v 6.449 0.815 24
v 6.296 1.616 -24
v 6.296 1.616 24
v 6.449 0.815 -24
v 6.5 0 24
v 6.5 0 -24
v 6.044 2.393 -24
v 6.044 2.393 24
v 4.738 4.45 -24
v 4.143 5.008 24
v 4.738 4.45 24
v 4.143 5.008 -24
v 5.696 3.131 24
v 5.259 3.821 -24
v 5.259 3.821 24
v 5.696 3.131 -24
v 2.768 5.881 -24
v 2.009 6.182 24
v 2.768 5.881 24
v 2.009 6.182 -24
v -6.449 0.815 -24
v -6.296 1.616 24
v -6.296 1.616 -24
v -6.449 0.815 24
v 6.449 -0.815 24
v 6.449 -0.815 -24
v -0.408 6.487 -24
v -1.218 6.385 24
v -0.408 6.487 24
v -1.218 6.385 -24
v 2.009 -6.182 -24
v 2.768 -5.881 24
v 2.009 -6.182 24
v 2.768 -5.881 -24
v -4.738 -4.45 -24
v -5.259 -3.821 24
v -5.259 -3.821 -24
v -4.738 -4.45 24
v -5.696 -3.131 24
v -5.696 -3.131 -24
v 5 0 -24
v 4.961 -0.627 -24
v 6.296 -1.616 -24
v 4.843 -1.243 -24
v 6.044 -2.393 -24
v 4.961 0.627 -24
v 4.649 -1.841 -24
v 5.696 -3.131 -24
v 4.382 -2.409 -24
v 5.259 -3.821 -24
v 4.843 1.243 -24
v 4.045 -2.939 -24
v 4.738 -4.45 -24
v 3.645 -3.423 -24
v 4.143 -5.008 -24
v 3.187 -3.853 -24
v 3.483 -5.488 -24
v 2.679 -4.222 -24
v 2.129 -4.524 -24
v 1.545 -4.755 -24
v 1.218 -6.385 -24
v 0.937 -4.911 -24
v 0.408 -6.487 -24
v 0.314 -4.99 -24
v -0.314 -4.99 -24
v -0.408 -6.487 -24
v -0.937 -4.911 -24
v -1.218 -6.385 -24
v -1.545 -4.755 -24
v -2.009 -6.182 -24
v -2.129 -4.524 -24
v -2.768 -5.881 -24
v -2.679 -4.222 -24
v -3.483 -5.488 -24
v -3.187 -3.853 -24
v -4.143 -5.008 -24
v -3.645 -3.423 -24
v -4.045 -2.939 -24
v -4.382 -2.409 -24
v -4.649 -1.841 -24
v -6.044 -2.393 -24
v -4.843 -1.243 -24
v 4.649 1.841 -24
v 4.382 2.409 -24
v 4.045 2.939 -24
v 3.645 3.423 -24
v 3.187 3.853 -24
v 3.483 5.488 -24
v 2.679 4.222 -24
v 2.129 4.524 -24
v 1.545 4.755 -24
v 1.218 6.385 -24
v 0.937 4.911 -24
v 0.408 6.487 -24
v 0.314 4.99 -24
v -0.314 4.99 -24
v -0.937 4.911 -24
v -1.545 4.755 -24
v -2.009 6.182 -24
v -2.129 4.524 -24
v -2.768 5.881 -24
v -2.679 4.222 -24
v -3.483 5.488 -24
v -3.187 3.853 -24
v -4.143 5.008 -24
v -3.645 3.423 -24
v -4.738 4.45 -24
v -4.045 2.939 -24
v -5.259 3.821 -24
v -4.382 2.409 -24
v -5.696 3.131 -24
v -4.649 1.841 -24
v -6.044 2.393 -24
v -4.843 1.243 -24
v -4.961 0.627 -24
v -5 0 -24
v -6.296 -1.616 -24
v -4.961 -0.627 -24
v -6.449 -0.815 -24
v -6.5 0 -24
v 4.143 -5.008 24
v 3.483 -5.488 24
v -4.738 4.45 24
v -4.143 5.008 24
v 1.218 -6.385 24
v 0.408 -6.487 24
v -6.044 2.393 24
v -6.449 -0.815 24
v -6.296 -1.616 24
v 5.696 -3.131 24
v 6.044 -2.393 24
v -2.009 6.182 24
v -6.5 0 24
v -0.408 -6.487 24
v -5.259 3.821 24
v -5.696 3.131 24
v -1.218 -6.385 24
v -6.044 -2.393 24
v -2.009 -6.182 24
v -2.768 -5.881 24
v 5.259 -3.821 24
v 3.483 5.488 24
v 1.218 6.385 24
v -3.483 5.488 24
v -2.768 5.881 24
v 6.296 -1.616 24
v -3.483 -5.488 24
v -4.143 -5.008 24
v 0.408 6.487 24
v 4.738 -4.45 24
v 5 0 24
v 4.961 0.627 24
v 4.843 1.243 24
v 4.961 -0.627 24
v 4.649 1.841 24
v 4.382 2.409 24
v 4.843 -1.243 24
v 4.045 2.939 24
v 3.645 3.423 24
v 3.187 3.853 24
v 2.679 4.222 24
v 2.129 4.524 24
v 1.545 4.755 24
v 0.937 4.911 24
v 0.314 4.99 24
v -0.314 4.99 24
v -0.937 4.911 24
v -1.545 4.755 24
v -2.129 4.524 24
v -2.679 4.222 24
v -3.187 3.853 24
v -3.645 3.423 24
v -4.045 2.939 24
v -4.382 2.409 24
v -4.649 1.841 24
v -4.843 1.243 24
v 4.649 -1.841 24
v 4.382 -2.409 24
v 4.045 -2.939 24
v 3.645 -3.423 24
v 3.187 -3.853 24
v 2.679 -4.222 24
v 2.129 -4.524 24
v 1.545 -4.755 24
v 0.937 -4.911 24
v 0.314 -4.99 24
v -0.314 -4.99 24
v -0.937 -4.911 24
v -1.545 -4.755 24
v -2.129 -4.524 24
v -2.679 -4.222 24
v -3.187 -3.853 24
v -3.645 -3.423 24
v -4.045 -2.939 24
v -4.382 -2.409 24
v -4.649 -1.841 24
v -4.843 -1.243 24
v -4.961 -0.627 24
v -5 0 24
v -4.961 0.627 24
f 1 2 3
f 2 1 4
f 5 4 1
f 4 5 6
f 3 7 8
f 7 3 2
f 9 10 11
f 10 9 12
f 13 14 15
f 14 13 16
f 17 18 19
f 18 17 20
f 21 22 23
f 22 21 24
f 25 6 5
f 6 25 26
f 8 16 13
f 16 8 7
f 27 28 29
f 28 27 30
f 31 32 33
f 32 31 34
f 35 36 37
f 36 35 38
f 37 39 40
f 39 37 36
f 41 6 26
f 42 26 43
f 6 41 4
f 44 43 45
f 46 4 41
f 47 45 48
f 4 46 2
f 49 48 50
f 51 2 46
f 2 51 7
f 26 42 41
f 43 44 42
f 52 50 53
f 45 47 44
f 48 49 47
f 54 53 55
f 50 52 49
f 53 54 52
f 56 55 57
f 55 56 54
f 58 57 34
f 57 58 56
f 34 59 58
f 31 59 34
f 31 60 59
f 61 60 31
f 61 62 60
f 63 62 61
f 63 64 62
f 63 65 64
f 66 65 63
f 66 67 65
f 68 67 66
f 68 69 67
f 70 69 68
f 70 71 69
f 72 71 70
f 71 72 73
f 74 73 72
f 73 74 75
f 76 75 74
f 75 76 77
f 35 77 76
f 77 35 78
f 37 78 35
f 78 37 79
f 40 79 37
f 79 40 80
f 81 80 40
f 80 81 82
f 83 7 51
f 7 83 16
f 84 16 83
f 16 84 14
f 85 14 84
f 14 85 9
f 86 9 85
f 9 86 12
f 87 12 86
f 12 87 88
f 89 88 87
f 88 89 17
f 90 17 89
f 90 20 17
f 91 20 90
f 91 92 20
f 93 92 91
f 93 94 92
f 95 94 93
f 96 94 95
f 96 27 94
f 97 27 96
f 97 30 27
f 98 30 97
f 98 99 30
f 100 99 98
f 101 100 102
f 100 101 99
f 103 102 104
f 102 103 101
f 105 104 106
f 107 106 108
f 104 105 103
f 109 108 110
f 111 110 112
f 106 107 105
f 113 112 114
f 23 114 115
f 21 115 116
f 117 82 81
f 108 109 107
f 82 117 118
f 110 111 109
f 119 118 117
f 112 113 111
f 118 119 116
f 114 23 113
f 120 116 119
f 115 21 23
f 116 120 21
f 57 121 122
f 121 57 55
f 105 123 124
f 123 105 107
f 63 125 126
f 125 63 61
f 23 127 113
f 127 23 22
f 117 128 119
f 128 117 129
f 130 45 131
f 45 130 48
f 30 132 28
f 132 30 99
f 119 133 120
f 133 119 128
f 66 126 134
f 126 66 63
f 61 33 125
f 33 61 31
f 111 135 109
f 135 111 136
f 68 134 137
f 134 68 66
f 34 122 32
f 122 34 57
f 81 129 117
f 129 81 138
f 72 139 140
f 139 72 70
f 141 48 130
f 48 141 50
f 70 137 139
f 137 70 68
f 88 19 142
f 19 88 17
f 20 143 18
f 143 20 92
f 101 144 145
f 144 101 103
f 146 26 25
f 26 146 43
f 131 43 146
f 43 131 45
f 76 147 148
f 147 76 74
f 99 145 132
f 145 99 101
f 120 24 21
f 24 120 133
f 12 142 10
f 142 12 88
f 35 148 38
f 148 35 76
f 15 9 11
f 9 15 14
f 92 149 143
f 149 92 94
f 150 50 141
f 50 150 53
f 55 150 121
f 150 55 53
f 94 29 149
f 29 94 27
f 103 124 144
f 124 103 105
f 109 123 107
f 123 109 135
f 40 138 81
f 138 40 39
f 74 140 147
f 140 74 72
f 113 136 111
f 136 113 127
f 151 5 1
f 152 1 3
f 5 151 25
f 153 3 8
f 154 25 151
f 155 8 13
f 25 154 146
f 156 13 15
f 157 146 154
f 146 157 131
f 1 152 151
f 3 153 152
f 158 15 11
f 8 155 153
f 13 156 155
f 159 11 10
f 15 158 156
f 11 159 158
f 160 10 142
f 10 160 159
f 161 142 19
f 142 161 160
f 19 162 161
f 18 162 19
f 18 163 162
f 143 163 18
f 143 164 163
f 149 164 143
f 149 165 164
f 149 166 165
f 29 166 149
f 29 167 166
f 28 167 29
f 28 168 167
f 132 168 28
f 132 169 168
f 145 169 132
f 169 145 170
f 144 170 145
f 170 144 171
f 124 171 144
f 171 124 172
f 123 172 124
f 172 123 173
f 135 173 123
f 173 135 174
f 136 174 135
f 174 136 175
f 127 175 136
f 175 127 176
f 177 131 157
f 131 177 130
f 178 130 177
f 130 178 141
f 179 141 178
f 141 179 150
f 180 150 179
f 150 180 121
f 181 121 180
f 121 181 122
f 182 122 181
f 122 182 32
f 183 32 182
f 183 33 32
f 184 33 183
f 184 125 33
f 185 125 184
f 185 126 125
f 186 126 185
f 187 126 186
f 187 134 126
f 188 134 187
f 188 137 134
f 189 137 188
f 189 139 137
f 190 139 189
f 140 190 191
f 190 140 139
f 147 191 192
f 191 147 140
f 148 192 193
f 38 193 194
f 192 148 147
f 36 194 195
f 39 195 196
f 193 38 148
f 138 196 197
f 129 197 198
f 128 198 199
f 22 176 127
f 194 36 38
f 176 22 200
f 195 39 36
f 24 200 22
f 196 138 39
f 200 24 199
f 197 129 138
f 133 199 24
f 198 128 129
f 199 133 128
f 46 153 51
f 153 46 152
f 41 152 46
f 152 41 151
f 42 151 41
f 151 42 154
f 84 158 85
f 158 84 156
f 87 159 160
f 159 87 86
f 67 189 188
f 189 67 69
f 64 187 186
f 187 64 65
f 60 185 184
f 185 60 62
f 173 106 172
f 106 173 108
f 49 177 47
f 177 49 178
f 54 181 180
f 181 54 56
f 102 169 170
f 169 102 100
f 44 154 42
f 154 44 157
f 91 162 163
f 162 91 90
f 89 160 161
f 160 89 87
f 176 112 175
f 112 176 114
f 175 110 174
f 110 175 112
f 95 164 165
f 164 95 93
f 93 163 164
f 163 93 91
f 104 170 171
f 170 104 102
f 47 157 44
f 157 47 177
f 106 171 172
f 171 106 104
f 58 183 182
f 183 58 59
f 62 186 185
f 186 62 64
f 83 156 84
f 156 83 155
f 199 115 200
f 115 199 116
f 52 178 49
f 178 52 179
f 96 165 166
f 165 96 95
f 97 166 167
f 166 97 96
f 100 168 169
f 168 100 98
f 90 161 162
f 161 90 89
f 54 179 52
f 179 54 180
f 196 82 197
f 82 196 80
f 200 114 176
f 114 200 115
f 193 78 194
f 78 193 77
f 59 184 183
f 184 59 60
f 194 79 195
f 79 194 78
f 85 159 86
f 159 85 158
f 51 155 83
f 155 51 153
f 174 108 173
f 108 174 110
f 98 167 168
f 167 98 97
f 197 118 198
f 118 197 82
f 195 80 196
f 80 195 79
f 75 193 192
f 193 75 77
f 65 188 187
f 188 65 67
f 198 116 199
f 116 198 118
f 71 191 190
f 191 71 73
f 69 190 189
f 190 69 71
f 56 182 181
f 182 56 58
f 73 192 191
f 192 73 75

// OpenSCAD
$fn = 50;


difference() {
	union() {
		translate(v = [0, 0, -24.0000000000]) {
			cylinder(h = 48, r = 6.5000000000);
		}
	}
	union() {
		translate(v = [0, 0, -100.0000000000]) {
			cylinder(h = 200, r = 5.0000000000);
		}
	}
}
